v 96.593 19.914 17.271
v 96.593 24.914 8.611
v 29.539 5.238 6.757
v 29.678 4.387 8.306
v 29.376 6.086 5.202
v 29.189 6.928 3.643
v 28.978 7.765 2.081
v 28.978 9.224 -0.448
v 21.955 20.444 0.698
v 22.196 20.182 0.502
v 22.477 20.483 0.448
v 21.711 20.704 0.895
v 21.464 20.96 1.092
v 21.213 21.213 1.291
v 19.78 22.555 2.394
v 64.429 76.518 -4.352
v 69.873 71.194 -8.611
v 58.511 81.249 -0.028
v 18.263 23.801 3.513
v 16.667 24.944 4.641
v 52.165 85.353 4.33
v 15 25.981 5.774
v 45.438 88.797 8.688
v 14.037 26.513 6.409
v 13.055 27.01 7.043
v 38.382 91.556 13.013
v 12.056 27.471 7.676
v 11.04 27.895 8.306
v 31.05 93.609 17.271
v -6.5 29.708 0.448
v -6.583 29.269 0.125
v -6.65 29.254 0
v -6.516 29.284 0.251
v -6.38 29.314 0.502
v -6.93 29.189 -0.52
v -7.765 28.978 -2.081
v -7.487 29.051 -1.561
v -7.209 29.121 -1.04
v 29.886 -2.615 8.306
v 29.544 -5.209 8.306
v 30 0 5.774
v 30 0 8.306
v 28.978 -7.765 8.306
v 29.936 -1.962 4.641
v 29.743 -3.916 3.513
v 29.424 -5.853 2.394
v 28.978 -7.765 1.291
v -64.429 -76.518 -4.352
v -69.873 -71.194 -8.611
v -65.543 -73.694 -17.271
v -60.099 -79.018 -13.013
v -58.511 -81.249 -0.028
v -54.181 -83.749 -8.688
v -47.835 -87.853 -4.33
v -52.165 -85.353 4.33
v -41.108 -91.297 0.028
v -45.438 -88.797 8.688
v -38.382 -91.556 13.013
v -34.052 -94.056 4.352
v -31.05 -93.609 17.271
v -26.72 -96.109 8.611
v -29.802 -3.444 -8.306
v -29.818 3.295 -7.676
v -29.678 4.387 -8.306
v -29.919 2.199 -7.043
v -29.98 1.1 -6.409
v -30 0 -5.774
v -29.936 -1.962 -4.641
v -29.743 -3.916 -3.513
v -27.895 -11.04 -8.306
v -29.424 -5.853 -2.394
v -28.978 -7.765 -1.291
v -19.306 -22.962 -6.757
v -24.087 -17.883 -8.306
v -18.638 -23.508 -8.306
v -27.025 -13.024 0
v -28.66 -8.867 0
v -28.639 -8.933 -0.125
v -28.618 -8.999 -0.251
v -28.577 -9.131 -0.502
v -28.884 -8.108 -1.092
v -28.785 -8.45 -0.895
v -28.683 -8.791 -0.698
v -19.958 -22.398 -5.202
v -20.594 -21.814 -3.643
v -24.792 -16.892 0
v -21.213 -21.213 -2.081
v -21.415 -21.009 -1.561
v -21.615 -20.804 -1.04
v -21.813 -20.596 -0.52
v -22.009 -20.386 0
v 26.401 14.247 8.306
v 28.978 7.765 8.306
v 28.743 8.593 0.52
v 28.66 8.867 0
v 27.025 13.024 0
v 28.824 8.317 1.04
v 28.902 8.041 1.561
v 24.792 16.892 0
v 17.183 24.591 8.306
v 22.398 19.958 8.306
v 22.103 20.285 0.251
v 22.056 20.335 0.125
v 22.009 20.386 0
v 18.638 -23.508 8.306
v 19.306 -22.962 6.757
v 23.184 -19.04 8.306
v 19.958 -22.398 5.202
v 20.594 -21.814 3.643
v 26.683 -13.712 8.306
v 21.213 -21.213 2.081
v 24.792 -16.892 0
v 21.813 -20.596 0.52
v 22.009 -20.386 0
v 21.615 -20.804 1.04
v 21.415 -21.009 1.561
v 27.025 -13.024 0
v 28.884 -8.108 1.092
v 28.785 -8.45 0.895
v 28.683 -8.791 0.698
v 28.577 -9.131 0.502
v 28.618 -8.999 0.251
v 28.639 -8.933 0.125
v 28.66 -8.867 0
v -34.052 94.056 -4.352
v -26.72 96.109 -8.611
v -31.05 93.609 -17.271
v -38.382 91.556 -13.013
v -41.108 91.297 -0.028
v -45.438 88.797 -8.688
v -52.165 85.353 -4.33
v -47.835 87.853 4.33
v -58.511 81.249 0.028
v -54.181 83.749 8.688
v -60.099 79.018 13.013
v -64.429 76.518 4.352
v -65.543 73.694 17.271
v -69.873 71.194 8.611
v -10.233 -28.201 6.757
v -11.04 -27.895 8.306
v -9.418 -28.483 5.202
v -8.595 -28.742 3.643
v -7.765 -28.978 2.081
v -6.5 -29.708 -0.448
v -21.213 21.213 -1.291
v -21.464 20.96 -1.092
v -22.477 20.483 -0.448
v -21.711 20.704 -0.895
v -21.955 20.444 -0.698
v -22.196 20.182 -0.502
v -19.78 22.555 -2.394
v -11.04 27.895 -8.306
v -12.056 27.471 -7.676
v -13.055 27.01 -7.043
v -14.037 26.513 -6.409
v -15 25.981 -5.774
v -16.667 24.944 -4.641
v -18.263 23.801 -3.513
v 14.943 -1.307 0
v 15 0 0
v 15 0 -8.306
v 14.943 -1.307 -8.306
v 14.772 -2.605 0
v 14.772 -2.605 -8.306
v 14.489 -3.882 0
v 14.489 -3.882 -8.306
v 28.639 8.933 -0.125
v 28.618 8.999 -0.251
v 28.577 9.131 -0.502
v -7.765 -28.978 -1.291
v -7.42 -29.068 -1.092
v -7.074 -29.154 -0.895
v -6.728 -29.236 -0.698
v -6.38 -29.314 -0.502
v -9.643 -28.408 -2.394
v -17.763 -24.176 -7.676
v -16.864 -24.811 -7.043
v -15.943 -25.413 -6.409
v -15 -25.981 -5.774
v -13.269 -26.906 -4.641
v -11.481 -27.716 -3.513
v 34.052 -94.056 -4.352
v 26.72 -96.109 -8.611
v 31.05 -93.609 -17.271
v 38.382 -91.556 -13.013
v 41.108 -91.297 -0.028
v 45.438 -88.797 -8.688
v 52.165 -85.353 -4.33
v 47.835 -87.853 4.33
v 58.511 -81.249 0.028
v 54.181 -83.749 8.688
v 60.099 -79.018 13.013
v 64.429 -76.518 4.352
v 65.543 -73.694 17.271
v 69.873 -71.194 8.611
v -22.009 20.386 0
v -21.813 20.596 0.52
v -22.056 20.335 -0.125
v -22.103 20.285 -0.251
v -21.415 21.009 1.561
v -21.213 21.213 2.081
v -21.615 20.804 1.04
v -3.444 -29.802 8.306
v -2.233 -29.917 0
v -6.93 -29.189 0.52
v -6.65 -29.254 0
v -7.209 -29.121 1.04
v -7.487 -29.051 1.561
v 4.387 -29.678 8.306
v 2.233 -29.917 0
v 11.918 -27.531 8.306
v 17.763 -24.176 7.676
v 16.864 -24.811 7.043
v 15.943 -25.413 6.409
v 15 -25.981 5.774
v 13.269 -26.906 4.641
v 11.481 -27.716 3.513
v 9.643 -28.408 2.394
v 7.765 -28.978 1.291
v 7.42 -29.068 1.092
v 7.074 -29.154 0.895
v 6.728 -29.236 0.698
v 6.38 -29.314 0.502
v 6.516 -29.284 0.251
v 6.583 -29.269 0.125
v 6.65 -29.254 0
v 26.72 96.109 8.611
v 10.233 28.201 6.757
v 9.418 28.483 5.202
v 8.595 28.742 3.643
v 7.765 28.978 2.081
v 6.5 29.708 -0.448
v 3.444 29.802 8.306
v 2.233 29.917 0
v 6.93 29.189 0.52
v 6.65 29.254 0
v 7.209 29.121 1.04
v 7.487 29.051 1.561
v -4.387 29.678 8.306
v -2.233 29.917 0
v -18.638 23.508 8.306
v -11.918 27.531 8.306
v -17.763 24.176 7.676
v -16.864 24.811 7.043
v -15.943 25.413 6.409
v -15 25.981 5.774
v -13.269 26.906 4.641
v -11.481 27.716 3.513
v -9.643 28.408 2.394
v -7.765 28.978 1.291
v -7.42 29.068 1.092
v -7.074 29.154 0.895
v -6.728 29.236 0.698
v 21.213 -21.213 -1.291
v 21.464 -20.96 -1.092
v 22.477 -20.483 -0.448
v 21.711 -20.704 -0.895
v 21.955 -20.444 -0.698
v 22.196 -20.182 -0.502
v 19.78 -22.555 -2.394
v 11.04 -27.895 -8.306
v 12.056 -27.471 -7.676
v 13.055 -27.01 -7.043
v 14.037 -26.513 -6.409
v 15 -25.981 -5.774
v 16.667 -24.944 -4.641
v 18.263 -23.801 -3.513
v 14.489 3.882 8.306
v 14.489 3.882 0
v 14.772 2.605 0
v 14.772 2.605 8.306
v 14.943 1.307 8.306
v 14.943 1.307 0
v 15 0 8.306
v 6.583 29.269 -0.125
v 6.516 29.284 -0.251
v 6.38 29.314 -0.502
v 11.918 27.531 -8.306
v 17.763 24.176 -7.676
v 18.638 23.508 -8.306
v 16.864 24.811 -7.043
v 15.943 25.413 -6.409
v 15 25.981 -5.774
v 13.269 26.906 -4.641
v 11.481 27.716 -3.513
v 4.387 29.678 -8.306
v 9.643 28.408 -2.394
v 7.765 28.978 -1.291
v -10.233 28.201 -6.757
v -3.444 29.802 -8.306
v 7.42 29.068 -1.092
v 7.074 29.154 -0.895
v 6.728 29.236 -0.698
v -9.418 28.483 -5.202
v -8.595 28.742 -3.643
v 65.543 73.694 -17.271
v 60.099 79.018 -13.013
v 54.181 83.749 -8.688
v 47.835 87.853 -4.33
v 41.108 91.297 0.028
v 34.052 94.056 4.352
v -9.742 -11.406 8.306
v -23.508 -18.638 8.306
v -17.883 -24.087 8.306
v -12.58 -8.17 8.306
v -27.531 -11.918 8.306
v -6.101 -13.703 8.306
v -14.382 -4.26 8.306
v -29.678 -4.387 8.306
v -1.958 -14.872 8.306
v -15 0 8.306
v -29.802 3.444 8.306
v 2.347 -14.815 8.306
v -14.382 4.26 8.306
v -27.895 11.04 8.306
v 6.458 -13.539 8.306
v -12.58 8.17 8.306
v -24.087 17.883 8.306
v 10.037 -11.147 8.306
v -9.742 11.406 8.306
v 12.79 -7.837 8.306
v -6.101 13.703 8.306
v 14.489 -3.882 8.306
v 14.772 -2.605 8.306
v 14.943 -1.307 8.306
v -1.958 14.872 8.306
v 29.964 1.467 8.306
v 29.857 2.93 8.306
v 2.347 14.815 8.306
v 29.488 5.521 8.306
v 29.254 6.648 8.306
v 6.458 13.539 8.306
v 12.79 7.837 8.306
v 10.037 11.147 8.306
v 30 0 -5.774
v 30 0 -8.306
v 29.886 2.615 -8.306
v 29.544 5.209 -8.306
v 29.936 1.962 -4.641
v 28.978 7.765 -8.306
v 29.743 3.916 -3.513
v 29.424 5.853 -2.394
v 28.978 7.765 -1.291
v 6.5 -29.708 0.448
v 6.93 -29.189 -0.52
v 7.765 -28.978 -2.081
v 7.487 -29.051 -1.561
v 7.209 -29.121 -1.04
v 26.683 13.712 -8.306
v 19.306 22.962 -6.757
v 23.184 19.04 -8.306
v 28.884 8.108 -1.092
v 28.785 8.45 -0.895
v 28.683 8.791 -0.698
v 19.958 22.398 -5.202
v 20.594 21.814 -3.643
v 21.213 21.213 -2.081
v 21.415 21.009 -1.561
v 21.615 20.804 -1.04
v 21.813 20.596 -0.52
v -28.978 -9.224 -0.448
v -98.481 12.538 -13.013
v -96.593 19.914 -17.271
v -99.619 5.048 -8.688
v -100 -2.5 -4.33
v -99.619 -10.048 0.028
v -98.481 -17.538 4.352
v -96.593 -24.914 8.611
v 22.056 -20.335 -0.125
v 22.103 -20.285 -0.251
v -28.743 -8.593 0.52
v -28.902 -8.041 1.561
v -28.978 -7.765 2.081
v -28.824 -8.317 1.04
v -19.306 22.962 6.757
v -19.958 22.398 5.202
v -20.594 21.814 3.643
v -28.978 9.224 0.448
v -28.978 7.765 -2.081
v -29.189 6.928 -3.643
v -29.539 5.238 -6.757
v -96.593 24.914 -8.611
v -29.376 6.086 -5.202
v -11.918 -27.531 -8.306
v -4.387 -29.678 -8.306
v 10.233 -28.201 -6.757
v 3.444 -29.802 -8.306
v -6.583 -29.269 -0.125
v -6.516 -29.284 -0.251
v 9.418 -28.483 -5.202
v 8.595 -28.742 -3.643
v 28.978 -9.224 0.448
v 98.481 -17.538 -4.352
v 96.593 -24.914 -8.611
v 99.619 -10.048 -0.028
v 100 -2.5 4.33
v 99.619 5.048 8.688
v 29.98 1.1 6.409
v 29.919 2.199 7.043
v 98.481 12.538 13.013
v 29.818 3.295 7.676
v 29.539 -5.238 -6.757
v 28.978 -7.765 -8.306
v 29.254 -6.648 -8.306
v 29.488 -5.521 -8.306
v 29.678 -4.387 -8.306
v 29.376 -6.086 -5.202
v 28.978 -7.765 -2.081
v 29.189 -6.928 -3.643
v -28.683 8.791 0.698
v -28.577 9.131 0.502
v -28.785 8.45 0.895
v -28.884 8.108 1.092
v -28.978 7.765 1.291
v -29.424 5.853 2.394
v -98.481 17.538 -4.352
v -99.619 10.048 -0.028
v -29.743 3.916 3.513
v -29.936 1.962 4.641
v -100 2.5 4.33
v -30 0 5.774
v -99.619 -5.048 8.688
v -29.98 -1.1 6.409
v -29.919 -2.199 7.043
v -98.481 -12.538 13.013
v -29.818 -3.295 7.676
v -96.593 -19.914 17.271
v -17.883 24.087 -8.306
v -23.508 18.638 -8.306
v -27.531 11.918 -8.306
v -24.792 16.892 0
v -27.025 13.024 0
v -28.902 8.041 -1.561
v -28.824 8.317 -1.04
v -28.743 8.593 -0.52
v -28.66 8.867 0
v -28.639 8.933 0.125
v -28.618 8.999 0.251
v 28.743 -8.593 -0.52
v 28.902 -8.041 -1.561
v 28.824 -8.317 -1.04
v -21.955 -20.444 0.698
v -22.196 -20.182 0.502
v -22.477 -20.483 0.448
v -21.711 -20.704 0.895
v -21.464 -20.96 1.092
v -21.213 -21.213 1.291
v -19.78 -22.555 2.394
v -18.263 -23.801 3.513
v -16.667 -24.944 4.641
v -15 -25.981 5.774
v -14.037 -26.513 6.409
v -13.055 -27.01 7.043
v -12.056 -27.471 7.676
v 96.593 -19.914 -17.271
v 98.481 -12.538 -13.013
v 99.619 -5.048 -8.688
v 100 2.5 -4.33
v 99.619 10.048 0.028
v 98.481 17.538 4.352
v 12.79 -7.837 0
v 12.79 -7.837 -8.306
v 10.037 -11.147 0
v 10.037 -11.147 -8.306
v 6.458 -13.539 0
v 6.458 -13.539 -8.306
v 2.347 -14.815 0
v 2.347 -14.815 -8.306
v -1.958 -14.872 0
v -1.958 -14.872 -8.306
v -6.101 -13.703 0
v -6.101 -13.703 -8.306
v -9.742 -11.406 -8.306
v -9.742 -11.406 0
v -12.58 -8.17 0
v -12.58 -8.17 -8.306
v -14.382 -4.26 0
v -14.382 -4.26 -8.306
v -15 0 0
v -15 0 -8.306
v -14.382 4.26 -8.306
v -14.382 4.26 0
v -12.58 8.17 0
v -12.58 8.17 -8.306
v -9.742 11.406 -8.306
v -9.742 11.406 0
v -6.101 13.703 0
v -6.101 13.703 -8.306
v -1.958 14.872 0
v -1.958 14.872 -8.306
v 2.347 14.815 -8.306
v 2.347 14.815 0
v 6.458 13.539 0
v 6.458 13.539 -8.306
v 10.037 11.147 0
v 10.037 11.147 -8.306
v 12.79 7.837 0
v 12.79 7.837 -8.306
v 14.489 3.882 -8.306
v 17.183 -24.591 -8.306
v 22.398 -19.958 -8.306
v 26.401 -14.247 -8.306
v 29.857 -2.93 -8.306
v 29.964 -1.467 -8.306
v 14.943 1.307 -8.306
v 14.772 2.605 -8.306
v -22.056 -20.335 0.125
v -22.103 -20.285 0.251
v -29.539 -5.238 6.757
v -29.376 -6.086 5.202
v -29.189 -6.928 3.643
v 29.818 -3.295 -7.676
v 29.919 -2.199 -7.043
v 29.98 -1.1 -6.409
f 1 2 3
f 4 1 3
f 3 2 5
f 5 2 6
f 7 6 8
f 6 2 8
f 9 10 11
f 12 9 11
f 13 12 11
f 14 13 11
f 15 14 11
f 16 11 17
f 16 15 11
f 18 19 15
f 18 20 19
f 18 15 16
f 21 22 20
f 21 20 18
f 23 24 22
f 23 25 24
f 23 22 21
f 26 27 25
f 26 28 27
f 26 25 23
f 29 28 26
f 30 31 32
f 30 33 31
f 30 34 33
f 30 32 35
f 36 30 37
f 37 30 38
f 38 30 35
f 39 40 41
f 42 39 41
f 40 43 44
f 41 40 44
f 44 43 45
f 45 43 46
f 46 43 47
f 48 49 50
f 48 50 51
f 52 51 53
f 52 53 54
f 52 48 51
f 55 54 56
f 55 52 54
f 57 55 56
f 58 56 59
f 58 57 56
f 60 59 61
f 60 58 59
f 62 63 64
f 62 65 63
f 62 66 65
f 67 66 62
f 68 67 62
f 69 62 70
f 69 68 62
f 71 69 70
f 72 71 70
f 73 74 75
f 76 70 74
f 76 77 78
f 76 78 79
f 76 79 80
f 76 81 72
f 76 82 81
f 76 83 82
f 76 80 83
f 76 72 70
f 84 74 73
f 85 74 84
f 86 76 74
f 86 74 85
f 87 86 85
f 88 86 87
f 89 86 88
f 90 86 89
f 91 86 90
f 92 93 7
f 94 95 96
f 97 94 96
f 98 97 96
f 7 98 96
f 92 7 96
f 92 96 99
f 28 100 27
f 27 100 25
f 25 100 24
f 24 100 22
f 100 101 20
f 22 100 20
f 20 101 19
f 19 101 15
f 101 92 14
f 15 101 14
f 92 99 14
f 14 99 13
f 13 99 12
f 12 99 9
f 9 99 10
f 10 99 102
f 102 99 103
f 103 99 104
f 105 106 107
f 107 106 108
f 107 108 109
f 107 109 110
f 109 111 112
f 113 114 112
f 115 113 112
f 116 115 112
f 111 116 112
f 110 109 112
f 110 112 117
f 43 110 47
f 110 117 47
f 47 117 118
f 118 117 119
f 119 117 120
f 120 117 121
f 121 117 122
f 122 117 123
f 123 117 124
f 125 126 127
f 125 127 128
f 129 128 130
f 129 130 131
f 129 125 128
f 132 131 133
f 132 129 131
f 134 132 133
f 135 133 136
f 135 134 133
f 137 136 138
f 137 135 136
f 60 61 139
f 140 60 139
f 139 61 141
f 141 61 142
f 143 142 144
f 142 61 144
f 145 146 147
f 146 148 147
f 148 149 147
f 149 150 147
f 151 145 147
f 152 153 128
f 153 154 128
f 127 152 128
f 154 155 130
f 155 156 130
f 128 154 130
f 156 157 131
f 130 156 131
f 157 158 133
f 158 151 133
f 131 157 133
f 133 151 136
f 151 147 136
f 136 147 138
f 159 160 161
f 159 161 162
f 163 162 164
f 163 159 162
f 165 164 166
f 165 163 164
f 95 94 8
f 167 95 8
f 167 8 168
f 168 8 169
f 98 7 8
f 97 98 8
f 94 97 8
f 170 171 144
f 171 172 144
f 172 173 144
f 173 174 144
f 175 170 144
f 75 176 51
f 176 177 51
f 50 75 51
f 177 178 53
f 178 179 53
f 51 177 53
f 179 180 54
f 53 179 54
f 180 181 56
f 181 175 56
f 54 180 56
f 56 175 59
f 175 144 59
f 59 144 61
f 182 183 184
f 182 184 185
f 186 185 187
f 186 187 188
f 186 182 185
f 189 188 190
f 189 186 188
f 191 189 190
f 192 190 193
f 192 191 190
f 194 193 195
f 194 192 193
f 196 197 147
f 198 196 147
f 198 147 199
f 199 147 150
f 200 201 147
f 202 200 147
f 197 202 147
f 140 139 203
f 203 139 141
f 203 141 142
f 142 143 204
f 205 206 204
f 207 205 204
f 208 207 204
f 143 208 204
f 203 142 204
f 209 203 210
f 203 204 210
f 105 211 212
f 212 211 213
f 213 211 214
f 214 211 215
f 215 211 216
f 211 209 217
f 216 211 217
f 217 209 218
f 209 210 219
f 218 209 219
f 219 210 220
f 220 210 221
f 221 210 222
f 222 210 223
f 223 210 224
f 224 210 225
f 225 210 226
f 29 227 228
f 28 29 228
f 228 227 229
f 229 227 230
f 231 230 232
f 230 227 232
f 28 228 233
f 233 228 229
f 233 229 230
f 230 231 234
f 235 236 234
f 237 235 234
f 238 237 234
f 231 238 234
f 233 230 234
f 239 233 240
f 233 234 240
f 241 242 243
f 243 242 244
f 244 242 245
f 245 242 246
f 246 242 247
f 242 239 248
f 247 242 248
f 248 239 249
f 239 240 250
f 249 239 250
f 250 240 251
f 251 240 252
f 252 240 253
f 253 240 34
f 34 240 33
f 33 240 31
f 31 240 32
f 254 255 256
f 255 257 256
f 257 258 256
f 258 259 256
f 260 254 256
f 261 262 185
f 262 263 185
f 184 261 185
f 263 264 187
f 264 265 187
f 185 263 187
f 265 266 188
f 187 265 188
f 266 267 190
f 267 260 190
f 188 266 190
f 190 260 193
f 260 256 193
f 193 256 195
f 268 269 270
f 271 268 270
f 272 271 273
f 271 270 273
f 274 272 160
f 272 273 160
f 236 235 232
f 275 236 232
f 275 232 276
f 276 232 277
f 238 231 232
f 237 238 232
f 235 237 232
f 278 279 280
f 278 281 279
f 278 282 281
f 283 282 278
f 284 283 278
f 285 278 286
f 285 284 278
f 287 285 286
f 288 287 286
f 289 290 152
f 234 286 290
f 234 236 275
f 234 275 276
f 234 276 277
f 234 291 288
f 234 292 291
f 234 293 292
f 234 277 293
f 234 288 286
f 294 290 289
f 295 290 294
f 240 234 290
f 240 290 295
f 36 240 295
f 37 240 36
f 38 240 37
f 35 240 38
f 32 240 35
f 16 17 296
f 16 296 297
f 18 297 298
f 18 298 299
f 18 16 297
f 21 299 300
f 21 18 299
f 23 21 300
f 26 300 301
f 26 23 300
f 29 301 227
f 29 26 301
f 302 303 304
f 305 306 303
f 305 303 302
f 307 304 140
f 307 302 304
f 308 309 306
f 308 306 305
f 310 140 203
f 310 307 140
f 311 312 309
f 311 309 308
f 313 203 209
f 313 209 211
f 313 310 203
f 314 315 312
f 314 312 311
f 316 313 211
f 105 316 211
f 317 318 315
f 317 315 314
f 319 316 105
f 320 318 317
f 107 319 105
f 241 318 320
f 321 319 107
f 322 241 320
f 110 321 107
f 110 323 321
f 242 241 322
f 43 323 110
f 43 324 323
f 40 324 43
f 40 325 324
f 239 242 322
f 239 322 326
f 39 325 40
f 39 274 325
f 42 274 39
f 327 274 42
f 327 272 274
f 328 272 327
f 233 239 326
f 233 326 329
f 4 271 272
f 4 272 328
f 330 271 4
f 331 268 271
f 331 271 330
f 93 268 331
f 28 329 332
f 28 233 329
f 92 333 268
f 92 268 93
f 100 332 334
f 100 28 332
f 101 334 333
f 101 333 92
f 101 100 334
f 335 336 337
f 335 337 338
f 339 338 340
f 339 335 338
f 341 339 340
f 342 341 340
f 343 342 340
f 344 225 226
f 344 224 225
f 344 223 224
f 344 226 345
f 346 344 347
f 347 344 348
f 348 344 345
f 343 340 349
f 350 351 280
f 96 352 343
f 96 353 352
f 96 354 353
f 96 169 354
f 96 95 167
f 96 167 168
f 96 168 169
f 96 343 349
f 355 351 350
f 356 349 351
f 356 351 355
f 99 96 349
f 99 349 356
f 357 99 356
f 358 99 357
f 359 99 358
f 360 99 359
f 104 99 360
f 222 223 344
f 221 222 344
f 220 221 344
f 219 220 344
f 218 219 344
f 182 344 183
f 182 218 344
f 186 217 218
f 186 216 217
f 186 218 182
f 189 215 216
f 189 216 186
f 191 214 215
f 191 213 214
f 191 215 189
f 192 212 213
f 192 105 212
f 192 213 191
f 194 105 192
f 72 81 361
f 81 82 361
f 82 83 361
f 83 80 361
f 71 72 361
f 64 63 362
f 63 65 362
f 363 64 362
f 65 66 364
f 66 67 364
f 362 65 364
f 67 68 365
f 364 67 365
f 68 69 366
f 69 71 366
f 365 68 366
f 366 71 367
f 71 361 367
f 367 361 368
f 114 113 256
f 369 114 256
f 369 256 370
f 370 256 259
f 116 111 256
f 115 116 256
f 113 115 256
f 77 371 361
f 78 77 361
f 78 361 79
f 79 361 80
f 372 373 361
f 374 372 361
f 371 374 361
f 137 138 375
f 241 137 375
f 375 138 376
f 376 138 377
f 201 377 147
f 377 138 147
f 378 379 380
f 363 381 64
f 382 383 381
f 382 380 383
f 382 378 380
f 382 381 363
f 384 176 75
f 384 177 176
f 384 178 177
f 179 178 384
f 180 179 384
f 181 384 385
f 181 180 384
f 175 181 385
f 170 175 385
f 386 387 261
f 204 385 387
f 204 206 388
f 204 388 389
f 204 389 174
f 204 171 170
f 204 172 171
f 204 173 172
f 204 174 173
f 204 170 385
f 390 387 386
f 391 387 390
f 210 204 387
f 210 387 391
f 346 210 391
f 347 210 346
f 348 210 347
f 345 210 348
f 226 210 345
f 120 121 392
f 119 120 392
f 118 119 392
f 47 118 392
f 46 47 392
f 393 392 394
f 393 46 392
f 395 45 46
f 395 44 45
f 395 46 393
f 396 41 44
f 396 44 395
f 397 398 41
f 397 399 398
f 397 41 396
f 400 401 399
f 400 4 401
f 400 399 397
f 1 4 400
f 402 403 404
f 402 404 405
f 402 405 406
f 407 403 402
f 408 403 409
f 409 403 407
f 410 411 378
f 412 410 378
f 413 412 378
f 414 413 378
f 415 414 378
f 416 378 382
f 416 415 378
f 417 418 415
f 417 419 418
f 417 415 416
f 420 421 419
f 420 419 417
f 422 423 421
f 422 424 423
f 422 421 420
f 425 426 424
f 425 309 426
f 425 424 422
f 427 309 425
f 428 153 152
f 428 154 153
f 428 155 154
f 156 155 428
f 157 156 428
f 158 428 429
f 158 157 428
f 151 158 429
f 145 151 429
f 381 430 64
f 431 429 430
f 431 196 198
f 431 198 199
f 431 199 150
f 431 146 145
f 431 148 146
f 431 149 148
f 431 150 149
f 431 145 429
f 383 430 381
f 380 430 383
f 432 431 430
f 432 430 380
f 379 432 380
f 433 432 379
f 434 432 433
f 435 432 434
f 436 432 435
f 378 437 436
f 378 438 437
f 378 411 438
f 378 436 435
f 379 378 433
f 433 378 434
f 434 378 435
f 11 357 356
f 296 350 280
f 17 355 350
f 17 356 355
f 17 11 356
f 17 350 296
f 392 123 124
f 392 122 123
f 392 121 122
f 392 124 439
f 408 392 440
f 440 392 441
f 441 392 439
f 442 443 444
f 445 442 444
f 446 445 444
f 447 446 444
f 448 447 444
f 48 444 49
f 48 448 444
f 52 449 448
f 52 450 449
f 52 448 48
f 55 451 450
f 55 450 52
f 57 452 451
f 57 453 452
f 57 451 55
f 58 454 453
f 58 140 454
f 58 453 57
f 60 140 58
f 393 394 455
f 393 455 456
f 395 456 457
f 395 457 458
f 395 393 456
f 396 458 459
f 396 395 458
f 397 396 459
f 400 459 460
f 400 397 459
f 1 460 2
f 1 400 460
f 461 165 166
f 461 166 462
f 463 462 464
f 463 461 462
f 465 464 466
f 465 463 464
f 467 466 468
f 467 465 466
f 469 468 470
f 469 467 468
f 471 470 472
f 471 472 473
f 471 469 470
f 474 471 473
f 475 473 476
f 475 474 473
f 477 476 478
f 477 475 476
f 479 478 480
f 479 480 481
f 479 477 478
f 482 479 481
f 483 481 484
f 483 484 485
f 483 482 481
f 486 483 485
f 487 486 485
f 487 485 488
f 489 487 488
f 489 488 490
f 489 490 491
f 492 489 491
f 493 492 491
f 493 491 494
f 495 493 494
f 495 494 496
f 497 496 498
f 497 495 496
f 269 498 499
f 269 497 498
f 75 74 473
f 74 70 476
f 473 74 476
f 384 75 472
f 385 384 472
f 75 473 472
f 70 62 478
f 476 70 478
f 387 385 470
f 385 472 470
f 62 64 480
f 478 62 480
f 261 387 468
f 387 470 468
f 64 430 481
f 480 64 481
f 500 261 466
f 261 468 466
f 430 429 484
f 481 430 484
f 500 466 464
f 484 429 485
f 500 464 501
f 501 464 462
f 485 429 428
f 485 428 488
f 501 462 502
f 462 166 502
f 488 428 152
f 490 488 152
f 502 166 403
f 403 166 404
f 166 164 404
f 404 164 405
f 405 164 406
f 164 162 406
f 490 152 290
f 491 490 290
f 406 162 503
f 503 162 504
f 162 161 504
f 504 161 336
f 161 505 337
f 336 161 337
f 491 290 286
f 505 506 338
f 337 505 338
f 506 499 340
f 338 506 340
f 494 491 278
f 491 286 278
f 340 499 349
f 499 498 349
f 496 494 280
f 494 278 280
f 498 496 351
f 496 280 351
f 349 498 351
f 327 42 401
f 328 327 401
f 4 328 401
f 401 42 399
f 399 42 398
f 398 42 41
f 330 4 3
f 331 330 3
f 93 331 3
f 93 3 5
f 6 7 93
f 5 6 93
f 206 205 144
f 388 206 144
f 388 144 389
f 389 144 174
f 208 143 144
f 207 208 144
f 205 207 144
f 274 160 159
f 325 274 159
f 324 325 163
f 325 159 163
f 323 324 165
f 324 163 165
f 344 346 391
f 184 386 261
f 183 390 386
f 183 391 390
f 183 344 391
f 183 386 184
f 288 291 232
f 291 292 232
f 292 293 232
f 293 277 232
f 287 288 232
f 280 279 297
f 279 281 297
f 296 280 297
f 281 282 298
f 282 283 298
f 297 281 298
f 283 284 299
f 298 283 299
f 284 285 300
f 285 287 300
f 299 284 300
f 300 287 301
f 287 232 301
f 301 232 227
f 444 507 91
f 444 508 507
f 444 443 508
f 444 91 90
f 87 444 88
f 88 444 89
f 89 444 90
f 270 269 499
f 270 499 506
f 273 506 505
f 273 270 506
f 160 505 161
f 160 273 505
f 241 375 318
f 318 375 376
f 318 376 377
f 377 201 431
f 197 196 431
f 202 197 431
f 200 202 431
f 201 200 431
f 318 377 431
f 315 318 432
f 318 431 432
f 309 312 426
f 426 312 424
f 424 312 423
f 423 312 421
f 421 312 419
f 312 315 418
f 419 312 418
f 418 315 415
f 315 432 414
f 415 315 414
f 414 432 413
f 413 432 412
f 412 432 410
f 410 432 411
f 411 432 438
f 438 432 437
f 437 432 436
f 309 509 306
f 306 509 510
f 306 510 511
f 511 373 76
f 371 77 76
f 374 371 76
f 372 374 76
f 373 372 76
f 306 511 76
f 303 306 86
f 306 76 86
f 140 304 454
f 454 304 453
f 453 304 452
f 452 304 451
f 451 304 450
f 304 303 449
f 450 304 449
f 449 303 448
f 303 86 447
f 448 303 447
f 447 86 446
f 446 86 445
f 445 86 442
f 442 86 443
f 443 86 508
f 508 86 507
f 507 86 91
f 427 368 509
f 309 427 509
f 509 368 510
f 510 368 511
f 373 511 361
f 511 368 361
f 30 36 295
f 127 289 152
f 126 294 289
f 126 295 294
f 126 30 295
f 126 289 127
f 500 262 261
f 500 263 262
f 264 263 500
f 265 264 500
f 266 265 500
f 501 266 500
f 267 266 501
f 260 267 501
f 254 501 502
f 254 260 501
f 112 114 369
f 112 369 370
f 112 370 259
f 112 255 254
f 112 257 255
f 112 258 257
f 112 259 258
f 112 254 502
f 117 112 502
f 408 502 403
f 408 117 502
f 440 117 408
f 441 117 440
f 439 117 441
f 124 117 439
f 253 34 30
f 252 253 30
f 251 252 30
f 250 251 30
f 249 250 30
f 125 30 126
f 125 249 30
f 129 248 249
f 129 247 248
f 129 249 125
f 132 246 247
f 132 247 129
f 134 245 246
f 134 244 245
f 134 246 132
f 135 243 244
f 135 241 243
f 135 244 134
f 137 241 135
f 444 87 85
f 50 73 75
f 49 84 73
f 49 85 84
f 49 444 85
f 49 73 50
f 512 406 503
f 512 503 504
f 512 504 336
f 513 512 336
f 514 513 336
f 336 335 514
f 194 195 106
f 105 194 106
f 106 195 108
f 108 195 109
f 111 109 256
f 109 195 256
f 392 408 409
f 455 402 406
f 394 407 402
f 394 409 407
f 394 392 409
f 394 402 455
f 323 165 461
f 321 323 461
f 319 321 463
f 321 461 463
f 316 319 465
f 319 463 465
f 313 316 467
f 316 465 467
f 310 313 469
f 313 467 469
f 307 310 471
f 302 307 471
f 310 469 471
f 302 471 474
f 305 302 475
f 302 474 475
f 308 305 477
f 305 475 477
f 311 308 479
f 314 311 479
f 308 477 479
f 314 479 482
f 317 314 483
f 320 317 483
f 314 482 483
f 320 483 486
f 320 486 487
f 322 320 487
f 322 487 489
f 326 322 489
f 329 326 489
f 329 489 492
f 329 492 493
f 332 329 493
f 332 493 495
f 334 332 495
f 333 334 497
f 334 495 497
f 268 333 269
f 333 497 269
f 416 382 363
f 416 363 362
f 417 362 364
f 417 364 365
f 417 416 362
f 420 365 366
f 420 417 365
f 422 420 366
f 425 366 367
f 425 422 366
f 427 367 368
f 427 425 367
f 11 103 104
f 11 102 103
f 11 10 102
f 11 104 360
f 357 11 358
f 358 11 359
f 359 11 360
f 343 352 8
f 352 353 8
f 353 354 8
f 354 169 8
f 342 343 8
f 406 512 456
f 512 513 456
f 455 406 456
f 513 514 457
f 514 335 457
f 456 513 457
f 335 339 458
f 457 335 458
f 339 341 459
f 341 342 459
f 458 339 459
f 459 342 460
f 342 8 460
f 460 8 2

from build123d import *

# Parameters (mm, degrees)
F1_DEPTH      = 5
F1_DEPTH_BACK = 5
F2_ANGLE      = 30
F3_DEPTH      = 25
F3_DEPTH_BACK = 25
F5_COUNT      = 6
F6_DEPTH      = 8.3061645655
F6_DEPTH_BACK = 8.3061645655


with BuildPart() as f1:
    # F0 (on Top) → F1 (new body, two sides)
    with BuildSketch(Plane.XY) as f1_sk:
        with BuildLine():
            ThreePointArc((28.9777747887, 7.7645713531), (29.7433458412, 3.9157857666), (30, 0))
            ThreePointArc((30, 0), (29.7433458412, -3.9157857666), (28.9777747887, -7.7645713531))
            Line((28.9777747887, -7.7645713531), (96.5925826289, -25.8819045103))
            ThreePointArc((96.5925826289, -25.8819045103), (99.1444861374, -13.052619222), (100, 0))
            ThreePointArc((100, 0), (99.1444861374, 13.052619222), (96.5925826289, 25.8819045103))
            Line((96.5925826289, 25.8819045103), (28.9777747887, 7.7645713531))
        make_face()
        with BuildLine():
            ThreePointArc((28.9777747887, -7.7645713531), (29.7433458412, -3.9157857666), (30, 0))
            ThreePointArc((30, 0), (29.7433458412, 3.9157857666), (28.9777747887, 7.7645713531))
            Line((28.9777747887, 7.7645713531), (14.4888873943, 3.8822856765))
            ThreePointArc((14.4888873943, 3.8822856765), (14.8716729206, 1.9578928833), (15, 0))
            ThreePointArc((15, 0), (14.8716729206, -1.9578928833), (14.4888873943, -3.8822856765))
            Line((14.4888873943, -3.8822856765), (28.9777747887, -7.7645713531))
        make_face()
    extrude(amount=F1_DEPTH)
    extrude(f1_sk.sketch, amount=-F1_DEPTH_BACK)


with BuildPart() as f1_1:
    # F2: moved
    add(f1.part.rotate(Axis((7.5, 0, 0), (1, 0, 0)), F2_ANGLE))

    # F0 (on Top) → F3 (cut, two sides)
    with BuildSketch(Plane.XY) as f3_sk:
        with BuildLine():
            Line((14.4888873943, 3.8822856765), (28.9777747887, 7.7645713531))
            ThreePointArc((28.9777747887, 7.7645713531), (-30, 0), (28.9777747887, -7.7645713531))
            Line((28.9777747887, -7.7645713531), (14.4888873943, -3.8822856765))
            ThreePointArc((14.4888873943, -3.8822856765), (-15, 0), (14.4888873943, 3.8822856765))
        make_face()
        with BuildLine():
            Line((0, 0), (14.4888873943, 3.8822856765))
            ThreePointArc((14.4888873943, 3.8822856765), (-15, 0), (14.4888873943, -3.8822856765))
            Line((14.4888873943, -3.8822856765), (0, 0))
        make_face()
        with BuildLine():
            Line((0, 0), (14.4888873943, -3.8822856765))
            ThreePointArc((14.4888873943, -3.8822856765), (14.8716729206, -1.9578928833), (15, 0))
            Line((15, 0), (0, 0))
        make_face()
        with BuildLine():
            ThreePointArc((15, 0), (14.8716729206, 1.9578928833), (14.4888873943, 3.8822856765))
            Line((14.4888873943, 3.8822856765), (0, 0))
            Line((0, 0), (15, 0))
        make_face()
        with BuildLine():
            ThreePointArc((28.9777747887, -7.7645713531), (29.7433458412, -3.9157857666), (30, 0))
            ThreePointArc((30, 0), (29.7433458412, 3.9157857666), (28.9777747887, 7.7645713531))
            Line((28.9777747887, 7.7645713531), (14.4888873943, 3.8822856765))
            ThreePointArc((14.4888873943, 3.8822856765), (14.8716729206, 1.9578928833), (15, 0))
            ThreePointArc((15, 0), (14.8716729206, -1.9578928833), (14.4888873943, -3.8822856765))
            Line((14.4888873943, -3.8822856765), (28.9777747887, -7.7645713531))
        make_face()
    extrude(amount=-F3_DEPTH, mode=Mode.SUBTRACT)
    extrude(f3_sk.sketch, amount=F3_DEPTH_BACK, mode=Mode.SUBTRACT)


with BuildPart() as f5_1:
    # F5: instance of F1
    add(f1_1.part.rotate(Axis((0, 0, 22.1990030259), (0, 0, 1)), 1 * 360 / F5_COUNT))


with BuildPart() as f5_2:
    # F5: instance of F1
    add(f1_1.part.rotate(Axis((0, 0, 22.1990030259), (0, 0, 1)), 2 * 360 / F5_COUNT))


with BuildPart() as f5_3:
    # F5: instance of F1
    add(f1_1.part.rotate(Axis((0, 0, 22.1990030259), (0, 0, 1)), 3 * 360 / F5_COUNT))


with BuildPart() as f5_4:
    # F5: instance of F1
    add(f1_1.part.rotate(Axis((0, 0, 22.1990030259), (0, 0, 1)), 4 * 360 / F5_COUNT))


with BuildPart() as f5_5:
    # F5: instance of F1
    add(f1_1.part.rotate(Axis((0, 0, 22.1990030259), (0, 0, 1)), 5 * 360 / F5_COUNT))


with BuildPart() as f1_2:
    add(f1_1.part)

    add(f5_1.part)  # F6 merges F5_1

    add(f5_2.part)  # F6 merges F5_2

    add(f5_3.part)  # F6 merges F5_3

    add(f5_4.part)  # F6 merges F5_4

    add(f5_5.part)  # F6 merges F5_5
    # F0 (on Top) → F6 (join, two sides)
    with BuildSketch(Plane.XY) as f6_sk:
        with BuildLine():
            Line((14.4888873943, 3.8822856765), (28.9777747887, 7.7645713531))
            ThreePointArc((28.9777747887, 7.7645713531), (-30, 0), (28.9777747887, -7.7645713531))
            Line((28.9777747887, -7.7645713531), (14.4888873943, -3.8822856765))
            ThreePointArc((14.4888873943, -3.8822856765), (-15, 0), (14.4888873943, 3.8822856765))
        make_face()
        with BuildLine():
            ThreePointArc((28.9777747887, -7.7645713531), (29.7433458412, -3.9157857666), (30, 0))
            ThreePointArc((30, 0), (29.7433458412, 3.9157857666), (28.9777747887, 7.7645713531))
            Line((28.9777747887, 7.7645713531), (14.4888873943, 3.8822856765))
            ThreePointArc((14.4888873943, 3.8822856765), (14.8716729206, 1.9578928833), (15, 0))
            ThreePointArc((15, 0), (14.8716729206, -1.9578928833), (14.4888873943, -3.8822856765))
            Line((14.4888873943, -3.8822856765), (28.9777747887, -7.7645713531))
        make_face()
    extrude(amount=F6_DEPTH)
    extrude(f6_sk.sketch, amount=-F6_DEPTH_BACK)


solid = f1_2.part
